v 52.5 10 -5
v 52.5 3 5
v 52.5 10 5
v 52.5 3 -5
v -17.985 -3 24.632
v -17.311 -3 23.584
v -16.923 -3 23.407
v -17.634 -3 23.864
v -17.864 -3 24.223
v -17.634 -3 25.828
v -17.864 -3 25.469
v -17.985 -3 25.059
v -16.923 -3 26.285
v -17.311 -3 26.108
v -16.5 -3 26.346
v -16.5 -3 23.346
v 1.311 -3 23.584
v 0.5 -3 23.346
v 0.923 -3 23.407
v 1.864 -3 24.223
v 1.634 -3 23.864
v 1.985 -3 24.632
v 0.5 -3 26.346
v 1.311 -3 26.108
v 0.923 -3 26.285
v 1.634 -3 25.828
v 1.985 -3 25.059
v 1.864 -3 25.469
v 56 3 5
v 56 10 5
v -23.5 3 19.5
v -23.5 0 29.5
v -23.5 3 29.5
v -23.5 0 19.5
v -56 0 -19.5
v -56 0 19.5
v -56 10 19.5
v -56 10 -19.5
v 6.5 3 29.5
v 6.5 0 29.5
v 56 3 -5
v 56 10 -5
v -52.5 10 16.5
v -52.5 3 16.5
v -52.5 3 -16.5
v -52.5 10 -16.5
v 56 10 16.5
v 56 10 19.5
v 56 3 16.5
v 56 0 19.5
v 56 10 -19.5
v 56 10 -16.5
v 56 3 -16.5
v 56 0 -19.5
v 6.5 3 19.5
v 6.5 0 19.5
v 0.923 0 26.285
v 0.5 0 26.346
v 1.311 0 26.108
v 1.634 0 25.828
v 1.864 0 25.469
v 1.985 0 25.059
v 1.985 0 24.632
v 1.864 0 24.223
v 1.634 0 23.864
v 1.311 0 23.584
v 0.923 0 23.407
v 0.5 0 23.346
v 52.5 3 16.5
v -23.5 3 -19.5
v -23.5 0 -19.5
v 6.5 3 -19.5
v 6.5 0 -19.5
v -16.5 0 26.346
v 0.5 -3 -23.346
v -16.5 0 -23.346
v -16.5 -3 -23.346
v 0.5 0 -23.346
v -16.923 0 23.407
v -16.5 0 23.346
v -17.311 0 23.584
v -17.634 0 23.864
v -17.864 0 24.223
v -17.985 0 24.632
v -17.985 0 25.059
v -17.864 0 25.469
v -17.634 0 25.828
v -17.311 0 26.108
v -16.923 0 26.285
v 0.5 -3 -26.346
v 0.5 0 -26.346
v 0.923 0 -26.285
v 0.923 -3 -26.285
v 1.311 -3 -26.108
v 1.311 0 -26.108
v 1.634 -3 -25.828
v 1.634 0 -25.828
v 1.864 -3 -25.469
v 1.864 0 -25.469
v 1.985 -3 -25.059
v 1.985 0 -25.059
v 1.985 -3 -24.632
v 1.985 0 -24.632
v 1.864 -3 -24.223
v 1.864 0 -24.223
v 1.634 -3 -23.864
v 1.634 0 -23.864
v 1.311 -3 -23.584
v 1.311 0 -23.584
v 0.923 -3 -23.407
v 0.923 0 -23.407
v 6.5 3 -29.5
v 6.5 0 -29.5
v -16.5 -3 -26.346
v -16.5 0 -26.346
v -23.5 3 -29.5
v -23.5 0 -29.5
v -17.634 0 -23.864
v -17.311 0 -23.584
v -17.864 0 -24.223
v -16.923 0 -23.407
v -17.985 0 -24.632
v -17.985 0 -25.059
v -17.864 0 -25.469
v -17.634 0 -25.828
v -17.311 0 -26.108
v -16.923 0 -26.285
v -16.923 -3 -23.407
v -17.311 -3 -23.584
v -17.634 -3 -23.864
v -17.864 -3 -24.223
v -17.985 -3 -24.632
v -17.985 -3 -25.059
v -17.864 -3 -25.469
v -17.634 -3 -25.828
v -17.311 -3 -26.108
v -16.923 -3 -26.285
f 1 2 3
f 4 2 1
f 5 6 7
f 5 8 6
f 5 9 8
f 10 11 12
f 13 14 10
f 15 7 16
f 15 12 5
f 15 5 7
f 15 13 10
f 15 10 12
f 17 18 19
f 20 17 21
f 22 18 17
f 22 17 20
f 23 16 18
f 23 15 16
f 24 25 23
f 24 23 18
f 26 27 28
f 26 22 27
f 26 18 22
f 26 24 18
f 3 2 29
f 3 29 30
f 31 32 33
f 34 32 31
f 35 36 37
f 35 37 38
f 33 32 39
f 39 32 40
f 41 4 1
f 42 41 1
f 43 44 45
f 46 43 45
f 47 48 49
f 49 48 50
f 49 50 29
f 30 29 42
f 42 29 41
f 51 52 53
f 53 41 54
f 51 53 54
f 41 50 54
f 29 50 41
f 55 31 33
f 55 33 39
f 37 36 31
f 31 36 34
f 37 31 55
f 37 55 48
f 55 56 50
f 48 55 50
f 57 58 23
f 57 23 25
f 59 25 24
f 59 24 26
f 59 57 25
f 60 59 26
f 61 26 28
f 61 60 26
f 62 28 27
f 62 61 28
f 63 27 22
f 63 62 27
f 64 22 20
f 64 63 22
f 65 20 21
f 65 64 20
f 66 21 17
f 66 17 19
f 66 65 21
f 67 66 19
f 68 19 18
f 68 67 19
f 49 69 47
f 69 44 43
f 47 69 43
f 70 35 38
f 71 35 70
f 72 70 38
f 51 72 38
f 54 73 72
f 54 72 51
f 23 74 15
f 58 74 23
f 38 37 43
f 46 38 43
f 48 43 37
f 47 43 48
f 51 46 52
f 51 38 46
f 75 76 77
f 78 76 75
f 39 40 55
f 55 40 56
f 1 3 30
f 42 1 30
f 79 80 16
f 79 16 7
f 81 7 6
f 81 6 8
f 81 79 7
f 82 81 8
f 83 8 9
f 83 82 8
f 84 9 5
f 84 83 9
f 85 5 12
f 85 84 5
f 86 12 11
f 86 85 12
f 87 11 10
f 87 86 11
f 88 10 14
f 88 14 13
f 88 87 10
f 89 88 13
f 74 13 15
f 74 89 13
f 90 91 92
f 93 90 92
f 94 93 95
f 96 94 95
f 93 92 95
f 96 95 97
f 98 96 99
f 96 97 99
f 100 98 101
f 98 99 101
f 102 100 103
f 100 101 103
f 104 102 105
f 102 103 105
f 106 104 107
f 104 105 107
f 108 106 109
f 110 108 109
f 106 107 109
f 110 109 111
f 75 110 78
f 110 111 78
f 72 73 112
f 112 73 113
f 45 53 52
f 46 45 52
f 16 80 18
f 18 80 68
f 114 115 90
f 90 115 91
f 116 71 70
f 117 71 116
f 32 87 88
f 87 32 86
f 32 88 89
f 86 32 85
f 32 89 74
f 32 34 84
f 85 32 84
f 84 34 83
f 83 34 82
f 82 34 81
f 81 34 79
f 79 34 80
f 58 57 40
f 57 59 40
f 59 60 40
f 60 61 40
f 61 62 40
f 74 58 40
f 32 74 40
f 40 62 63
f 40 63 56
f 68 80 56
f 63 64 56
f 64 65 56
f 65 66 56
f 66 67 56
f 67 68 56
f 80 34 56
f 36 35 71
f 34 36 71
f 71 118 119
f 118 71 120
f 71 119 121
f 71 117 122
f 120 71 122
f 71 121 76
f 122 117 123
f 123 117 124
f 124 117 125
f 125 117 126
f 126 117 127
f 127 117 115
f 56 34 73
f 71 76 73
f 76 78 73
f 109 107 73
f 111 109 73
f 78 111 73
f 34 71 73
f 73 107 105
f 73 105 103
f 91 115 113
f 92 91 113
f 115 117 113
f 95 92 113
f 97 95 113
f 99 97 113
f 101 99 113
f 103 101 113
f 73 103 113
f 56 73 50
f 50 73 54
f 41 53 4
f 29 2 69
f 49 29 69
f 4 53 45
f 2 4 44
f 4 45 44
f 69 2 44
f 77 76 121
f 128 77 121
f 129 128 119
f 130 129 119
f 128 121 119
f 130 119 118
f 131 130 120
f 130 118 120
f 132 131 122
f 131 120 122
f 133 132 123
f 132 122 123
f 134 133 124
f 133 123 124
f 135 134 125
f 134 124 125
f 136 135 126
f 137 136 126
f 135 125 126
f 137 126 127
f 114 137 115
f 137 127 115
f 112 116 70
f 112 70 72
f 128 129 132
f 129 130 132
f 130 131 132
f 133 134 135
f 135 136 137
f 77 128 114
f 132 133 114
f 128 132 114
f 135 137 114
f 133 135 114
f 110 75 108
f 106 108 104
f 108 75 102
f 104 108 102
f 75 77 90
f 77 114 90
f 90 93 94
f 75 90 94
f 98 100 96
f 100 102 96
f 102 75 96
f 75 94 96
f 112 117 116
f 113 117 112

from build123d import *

# Parameters (mm, degrees)
SKETCH1_W           = 112
SKETCH1_H           = 39
SKETCH1_W_2         = 105
SKETCH1_H_2         = 33
BOSS_EXTRUDE1_DEPTH = 10
SKETCH2_W           = 105
SKETCH2_H           = 33
BOSS_EXTRUDE2_DEPTH = 3
SKETCH3_W           = 11.5
SKETCH3_H           = 10.919197496
SKETCH3_H_2         = 11.051284563
CUT_EXTRUDE1_DEPTH  = 111.691011379
SKETCH4_W           = 30
SKETCH4_H           = 10
BOSS_EXTRUDE3_DEPTH = 3
SKETCH5_W           = 17
SKETCH5_H           = 3
BOSS_EXTRUDE4_DEPTH = 3


with BuildPart() as part:
    # Sketch1 → Boss-Extrude1 (new body)
    with BuildSketch(Plane(origin=(0, 0, 0), x_dir=(1, 0, 0), z_dir=(0, 1, 0))):
        Rectangle(SKETCH1_W, SKETCH1_H)
        Rectangle(SKETCH1_W_2, SKETCH1_H_2, mode=Mode.SUBTRACT)
    extrude(amount=BOSS_EXTRUDE1_DEPTH)

    # Sketch2 → Boss-Extrude2 (add)
    with BuildSketch(Plane(origin=(0, 0, 0), x_dir=(1, 0, 0), z_dir=(0, 1, 0))):
        Rectangle(SKETCH2_W, SKETCH2_H)
    extrude(amount=BOSS_EXTRUDE2_DEPTH)

    # Sketch3 → Cut-Extrude1 (cut, through all)
    with BuildSketch(Plane.ZY.offset(-52.5)):
        with Locations((-10.75, 8.459598748)):
            Rectangle(SKETCH3_W, SKETCH3_H)
        with Locations((10.75, 8.525642282)):
            Rectangle(SKETCH3_W, SKETCH3_H_2)
    extrude(amount=-CUT_EXTRUDE1_DEPTH, mode=Mode.SUBTRACT)

    # Sketch4 → Boss-Extrude3 (add)
    with BuildSketch(Plane(origin=(0, 0, 0), x_dir=(1, 0, 0), z_dir=(0, 1, 0))):
        with Locations((-8.5, 24.5)):
            Rectangle(SKETCH4_W, SKETCH4_H)
        with Locations((-8.5, -24.5)):
            Rectangle(SKETCH4_W, SKETCH4_H)
    extrude(amount=BOSS_EXTRUDE3_DEPTH)

    # Sketch5 → Boss-Extrude4 (add)
    with BuildSketch(Plane.XZ):
        with Locations((-8, 24.845915891)):
            Rectangle(SKETCH5_W, SKETCH5_H)
        with BuildLine():
            Line((-16.5, 26.345915891), (-16.5, 23.345915891))
            ThreePointArc((-16.5, 23.345915891), (-18, 24.845915891), (-16.5, 26.345915891))
        make_face()
        with BuildLine():
            ThreePointArc((0.5, 26.345915891), (2, 24.845915891), (0.5, 23.345915891))
            Line((0.5, 23.345915891), (0.5, 26.345915891))
        make_face()
    boss_extrude4 = extrude(amount=BOSS_EXTRUDE4_DEPTH)

    # Mirror1: Boss-Extrude4 across plane
    add(boss_extrude4.mirror(Plane.XY))


solid = part.part
